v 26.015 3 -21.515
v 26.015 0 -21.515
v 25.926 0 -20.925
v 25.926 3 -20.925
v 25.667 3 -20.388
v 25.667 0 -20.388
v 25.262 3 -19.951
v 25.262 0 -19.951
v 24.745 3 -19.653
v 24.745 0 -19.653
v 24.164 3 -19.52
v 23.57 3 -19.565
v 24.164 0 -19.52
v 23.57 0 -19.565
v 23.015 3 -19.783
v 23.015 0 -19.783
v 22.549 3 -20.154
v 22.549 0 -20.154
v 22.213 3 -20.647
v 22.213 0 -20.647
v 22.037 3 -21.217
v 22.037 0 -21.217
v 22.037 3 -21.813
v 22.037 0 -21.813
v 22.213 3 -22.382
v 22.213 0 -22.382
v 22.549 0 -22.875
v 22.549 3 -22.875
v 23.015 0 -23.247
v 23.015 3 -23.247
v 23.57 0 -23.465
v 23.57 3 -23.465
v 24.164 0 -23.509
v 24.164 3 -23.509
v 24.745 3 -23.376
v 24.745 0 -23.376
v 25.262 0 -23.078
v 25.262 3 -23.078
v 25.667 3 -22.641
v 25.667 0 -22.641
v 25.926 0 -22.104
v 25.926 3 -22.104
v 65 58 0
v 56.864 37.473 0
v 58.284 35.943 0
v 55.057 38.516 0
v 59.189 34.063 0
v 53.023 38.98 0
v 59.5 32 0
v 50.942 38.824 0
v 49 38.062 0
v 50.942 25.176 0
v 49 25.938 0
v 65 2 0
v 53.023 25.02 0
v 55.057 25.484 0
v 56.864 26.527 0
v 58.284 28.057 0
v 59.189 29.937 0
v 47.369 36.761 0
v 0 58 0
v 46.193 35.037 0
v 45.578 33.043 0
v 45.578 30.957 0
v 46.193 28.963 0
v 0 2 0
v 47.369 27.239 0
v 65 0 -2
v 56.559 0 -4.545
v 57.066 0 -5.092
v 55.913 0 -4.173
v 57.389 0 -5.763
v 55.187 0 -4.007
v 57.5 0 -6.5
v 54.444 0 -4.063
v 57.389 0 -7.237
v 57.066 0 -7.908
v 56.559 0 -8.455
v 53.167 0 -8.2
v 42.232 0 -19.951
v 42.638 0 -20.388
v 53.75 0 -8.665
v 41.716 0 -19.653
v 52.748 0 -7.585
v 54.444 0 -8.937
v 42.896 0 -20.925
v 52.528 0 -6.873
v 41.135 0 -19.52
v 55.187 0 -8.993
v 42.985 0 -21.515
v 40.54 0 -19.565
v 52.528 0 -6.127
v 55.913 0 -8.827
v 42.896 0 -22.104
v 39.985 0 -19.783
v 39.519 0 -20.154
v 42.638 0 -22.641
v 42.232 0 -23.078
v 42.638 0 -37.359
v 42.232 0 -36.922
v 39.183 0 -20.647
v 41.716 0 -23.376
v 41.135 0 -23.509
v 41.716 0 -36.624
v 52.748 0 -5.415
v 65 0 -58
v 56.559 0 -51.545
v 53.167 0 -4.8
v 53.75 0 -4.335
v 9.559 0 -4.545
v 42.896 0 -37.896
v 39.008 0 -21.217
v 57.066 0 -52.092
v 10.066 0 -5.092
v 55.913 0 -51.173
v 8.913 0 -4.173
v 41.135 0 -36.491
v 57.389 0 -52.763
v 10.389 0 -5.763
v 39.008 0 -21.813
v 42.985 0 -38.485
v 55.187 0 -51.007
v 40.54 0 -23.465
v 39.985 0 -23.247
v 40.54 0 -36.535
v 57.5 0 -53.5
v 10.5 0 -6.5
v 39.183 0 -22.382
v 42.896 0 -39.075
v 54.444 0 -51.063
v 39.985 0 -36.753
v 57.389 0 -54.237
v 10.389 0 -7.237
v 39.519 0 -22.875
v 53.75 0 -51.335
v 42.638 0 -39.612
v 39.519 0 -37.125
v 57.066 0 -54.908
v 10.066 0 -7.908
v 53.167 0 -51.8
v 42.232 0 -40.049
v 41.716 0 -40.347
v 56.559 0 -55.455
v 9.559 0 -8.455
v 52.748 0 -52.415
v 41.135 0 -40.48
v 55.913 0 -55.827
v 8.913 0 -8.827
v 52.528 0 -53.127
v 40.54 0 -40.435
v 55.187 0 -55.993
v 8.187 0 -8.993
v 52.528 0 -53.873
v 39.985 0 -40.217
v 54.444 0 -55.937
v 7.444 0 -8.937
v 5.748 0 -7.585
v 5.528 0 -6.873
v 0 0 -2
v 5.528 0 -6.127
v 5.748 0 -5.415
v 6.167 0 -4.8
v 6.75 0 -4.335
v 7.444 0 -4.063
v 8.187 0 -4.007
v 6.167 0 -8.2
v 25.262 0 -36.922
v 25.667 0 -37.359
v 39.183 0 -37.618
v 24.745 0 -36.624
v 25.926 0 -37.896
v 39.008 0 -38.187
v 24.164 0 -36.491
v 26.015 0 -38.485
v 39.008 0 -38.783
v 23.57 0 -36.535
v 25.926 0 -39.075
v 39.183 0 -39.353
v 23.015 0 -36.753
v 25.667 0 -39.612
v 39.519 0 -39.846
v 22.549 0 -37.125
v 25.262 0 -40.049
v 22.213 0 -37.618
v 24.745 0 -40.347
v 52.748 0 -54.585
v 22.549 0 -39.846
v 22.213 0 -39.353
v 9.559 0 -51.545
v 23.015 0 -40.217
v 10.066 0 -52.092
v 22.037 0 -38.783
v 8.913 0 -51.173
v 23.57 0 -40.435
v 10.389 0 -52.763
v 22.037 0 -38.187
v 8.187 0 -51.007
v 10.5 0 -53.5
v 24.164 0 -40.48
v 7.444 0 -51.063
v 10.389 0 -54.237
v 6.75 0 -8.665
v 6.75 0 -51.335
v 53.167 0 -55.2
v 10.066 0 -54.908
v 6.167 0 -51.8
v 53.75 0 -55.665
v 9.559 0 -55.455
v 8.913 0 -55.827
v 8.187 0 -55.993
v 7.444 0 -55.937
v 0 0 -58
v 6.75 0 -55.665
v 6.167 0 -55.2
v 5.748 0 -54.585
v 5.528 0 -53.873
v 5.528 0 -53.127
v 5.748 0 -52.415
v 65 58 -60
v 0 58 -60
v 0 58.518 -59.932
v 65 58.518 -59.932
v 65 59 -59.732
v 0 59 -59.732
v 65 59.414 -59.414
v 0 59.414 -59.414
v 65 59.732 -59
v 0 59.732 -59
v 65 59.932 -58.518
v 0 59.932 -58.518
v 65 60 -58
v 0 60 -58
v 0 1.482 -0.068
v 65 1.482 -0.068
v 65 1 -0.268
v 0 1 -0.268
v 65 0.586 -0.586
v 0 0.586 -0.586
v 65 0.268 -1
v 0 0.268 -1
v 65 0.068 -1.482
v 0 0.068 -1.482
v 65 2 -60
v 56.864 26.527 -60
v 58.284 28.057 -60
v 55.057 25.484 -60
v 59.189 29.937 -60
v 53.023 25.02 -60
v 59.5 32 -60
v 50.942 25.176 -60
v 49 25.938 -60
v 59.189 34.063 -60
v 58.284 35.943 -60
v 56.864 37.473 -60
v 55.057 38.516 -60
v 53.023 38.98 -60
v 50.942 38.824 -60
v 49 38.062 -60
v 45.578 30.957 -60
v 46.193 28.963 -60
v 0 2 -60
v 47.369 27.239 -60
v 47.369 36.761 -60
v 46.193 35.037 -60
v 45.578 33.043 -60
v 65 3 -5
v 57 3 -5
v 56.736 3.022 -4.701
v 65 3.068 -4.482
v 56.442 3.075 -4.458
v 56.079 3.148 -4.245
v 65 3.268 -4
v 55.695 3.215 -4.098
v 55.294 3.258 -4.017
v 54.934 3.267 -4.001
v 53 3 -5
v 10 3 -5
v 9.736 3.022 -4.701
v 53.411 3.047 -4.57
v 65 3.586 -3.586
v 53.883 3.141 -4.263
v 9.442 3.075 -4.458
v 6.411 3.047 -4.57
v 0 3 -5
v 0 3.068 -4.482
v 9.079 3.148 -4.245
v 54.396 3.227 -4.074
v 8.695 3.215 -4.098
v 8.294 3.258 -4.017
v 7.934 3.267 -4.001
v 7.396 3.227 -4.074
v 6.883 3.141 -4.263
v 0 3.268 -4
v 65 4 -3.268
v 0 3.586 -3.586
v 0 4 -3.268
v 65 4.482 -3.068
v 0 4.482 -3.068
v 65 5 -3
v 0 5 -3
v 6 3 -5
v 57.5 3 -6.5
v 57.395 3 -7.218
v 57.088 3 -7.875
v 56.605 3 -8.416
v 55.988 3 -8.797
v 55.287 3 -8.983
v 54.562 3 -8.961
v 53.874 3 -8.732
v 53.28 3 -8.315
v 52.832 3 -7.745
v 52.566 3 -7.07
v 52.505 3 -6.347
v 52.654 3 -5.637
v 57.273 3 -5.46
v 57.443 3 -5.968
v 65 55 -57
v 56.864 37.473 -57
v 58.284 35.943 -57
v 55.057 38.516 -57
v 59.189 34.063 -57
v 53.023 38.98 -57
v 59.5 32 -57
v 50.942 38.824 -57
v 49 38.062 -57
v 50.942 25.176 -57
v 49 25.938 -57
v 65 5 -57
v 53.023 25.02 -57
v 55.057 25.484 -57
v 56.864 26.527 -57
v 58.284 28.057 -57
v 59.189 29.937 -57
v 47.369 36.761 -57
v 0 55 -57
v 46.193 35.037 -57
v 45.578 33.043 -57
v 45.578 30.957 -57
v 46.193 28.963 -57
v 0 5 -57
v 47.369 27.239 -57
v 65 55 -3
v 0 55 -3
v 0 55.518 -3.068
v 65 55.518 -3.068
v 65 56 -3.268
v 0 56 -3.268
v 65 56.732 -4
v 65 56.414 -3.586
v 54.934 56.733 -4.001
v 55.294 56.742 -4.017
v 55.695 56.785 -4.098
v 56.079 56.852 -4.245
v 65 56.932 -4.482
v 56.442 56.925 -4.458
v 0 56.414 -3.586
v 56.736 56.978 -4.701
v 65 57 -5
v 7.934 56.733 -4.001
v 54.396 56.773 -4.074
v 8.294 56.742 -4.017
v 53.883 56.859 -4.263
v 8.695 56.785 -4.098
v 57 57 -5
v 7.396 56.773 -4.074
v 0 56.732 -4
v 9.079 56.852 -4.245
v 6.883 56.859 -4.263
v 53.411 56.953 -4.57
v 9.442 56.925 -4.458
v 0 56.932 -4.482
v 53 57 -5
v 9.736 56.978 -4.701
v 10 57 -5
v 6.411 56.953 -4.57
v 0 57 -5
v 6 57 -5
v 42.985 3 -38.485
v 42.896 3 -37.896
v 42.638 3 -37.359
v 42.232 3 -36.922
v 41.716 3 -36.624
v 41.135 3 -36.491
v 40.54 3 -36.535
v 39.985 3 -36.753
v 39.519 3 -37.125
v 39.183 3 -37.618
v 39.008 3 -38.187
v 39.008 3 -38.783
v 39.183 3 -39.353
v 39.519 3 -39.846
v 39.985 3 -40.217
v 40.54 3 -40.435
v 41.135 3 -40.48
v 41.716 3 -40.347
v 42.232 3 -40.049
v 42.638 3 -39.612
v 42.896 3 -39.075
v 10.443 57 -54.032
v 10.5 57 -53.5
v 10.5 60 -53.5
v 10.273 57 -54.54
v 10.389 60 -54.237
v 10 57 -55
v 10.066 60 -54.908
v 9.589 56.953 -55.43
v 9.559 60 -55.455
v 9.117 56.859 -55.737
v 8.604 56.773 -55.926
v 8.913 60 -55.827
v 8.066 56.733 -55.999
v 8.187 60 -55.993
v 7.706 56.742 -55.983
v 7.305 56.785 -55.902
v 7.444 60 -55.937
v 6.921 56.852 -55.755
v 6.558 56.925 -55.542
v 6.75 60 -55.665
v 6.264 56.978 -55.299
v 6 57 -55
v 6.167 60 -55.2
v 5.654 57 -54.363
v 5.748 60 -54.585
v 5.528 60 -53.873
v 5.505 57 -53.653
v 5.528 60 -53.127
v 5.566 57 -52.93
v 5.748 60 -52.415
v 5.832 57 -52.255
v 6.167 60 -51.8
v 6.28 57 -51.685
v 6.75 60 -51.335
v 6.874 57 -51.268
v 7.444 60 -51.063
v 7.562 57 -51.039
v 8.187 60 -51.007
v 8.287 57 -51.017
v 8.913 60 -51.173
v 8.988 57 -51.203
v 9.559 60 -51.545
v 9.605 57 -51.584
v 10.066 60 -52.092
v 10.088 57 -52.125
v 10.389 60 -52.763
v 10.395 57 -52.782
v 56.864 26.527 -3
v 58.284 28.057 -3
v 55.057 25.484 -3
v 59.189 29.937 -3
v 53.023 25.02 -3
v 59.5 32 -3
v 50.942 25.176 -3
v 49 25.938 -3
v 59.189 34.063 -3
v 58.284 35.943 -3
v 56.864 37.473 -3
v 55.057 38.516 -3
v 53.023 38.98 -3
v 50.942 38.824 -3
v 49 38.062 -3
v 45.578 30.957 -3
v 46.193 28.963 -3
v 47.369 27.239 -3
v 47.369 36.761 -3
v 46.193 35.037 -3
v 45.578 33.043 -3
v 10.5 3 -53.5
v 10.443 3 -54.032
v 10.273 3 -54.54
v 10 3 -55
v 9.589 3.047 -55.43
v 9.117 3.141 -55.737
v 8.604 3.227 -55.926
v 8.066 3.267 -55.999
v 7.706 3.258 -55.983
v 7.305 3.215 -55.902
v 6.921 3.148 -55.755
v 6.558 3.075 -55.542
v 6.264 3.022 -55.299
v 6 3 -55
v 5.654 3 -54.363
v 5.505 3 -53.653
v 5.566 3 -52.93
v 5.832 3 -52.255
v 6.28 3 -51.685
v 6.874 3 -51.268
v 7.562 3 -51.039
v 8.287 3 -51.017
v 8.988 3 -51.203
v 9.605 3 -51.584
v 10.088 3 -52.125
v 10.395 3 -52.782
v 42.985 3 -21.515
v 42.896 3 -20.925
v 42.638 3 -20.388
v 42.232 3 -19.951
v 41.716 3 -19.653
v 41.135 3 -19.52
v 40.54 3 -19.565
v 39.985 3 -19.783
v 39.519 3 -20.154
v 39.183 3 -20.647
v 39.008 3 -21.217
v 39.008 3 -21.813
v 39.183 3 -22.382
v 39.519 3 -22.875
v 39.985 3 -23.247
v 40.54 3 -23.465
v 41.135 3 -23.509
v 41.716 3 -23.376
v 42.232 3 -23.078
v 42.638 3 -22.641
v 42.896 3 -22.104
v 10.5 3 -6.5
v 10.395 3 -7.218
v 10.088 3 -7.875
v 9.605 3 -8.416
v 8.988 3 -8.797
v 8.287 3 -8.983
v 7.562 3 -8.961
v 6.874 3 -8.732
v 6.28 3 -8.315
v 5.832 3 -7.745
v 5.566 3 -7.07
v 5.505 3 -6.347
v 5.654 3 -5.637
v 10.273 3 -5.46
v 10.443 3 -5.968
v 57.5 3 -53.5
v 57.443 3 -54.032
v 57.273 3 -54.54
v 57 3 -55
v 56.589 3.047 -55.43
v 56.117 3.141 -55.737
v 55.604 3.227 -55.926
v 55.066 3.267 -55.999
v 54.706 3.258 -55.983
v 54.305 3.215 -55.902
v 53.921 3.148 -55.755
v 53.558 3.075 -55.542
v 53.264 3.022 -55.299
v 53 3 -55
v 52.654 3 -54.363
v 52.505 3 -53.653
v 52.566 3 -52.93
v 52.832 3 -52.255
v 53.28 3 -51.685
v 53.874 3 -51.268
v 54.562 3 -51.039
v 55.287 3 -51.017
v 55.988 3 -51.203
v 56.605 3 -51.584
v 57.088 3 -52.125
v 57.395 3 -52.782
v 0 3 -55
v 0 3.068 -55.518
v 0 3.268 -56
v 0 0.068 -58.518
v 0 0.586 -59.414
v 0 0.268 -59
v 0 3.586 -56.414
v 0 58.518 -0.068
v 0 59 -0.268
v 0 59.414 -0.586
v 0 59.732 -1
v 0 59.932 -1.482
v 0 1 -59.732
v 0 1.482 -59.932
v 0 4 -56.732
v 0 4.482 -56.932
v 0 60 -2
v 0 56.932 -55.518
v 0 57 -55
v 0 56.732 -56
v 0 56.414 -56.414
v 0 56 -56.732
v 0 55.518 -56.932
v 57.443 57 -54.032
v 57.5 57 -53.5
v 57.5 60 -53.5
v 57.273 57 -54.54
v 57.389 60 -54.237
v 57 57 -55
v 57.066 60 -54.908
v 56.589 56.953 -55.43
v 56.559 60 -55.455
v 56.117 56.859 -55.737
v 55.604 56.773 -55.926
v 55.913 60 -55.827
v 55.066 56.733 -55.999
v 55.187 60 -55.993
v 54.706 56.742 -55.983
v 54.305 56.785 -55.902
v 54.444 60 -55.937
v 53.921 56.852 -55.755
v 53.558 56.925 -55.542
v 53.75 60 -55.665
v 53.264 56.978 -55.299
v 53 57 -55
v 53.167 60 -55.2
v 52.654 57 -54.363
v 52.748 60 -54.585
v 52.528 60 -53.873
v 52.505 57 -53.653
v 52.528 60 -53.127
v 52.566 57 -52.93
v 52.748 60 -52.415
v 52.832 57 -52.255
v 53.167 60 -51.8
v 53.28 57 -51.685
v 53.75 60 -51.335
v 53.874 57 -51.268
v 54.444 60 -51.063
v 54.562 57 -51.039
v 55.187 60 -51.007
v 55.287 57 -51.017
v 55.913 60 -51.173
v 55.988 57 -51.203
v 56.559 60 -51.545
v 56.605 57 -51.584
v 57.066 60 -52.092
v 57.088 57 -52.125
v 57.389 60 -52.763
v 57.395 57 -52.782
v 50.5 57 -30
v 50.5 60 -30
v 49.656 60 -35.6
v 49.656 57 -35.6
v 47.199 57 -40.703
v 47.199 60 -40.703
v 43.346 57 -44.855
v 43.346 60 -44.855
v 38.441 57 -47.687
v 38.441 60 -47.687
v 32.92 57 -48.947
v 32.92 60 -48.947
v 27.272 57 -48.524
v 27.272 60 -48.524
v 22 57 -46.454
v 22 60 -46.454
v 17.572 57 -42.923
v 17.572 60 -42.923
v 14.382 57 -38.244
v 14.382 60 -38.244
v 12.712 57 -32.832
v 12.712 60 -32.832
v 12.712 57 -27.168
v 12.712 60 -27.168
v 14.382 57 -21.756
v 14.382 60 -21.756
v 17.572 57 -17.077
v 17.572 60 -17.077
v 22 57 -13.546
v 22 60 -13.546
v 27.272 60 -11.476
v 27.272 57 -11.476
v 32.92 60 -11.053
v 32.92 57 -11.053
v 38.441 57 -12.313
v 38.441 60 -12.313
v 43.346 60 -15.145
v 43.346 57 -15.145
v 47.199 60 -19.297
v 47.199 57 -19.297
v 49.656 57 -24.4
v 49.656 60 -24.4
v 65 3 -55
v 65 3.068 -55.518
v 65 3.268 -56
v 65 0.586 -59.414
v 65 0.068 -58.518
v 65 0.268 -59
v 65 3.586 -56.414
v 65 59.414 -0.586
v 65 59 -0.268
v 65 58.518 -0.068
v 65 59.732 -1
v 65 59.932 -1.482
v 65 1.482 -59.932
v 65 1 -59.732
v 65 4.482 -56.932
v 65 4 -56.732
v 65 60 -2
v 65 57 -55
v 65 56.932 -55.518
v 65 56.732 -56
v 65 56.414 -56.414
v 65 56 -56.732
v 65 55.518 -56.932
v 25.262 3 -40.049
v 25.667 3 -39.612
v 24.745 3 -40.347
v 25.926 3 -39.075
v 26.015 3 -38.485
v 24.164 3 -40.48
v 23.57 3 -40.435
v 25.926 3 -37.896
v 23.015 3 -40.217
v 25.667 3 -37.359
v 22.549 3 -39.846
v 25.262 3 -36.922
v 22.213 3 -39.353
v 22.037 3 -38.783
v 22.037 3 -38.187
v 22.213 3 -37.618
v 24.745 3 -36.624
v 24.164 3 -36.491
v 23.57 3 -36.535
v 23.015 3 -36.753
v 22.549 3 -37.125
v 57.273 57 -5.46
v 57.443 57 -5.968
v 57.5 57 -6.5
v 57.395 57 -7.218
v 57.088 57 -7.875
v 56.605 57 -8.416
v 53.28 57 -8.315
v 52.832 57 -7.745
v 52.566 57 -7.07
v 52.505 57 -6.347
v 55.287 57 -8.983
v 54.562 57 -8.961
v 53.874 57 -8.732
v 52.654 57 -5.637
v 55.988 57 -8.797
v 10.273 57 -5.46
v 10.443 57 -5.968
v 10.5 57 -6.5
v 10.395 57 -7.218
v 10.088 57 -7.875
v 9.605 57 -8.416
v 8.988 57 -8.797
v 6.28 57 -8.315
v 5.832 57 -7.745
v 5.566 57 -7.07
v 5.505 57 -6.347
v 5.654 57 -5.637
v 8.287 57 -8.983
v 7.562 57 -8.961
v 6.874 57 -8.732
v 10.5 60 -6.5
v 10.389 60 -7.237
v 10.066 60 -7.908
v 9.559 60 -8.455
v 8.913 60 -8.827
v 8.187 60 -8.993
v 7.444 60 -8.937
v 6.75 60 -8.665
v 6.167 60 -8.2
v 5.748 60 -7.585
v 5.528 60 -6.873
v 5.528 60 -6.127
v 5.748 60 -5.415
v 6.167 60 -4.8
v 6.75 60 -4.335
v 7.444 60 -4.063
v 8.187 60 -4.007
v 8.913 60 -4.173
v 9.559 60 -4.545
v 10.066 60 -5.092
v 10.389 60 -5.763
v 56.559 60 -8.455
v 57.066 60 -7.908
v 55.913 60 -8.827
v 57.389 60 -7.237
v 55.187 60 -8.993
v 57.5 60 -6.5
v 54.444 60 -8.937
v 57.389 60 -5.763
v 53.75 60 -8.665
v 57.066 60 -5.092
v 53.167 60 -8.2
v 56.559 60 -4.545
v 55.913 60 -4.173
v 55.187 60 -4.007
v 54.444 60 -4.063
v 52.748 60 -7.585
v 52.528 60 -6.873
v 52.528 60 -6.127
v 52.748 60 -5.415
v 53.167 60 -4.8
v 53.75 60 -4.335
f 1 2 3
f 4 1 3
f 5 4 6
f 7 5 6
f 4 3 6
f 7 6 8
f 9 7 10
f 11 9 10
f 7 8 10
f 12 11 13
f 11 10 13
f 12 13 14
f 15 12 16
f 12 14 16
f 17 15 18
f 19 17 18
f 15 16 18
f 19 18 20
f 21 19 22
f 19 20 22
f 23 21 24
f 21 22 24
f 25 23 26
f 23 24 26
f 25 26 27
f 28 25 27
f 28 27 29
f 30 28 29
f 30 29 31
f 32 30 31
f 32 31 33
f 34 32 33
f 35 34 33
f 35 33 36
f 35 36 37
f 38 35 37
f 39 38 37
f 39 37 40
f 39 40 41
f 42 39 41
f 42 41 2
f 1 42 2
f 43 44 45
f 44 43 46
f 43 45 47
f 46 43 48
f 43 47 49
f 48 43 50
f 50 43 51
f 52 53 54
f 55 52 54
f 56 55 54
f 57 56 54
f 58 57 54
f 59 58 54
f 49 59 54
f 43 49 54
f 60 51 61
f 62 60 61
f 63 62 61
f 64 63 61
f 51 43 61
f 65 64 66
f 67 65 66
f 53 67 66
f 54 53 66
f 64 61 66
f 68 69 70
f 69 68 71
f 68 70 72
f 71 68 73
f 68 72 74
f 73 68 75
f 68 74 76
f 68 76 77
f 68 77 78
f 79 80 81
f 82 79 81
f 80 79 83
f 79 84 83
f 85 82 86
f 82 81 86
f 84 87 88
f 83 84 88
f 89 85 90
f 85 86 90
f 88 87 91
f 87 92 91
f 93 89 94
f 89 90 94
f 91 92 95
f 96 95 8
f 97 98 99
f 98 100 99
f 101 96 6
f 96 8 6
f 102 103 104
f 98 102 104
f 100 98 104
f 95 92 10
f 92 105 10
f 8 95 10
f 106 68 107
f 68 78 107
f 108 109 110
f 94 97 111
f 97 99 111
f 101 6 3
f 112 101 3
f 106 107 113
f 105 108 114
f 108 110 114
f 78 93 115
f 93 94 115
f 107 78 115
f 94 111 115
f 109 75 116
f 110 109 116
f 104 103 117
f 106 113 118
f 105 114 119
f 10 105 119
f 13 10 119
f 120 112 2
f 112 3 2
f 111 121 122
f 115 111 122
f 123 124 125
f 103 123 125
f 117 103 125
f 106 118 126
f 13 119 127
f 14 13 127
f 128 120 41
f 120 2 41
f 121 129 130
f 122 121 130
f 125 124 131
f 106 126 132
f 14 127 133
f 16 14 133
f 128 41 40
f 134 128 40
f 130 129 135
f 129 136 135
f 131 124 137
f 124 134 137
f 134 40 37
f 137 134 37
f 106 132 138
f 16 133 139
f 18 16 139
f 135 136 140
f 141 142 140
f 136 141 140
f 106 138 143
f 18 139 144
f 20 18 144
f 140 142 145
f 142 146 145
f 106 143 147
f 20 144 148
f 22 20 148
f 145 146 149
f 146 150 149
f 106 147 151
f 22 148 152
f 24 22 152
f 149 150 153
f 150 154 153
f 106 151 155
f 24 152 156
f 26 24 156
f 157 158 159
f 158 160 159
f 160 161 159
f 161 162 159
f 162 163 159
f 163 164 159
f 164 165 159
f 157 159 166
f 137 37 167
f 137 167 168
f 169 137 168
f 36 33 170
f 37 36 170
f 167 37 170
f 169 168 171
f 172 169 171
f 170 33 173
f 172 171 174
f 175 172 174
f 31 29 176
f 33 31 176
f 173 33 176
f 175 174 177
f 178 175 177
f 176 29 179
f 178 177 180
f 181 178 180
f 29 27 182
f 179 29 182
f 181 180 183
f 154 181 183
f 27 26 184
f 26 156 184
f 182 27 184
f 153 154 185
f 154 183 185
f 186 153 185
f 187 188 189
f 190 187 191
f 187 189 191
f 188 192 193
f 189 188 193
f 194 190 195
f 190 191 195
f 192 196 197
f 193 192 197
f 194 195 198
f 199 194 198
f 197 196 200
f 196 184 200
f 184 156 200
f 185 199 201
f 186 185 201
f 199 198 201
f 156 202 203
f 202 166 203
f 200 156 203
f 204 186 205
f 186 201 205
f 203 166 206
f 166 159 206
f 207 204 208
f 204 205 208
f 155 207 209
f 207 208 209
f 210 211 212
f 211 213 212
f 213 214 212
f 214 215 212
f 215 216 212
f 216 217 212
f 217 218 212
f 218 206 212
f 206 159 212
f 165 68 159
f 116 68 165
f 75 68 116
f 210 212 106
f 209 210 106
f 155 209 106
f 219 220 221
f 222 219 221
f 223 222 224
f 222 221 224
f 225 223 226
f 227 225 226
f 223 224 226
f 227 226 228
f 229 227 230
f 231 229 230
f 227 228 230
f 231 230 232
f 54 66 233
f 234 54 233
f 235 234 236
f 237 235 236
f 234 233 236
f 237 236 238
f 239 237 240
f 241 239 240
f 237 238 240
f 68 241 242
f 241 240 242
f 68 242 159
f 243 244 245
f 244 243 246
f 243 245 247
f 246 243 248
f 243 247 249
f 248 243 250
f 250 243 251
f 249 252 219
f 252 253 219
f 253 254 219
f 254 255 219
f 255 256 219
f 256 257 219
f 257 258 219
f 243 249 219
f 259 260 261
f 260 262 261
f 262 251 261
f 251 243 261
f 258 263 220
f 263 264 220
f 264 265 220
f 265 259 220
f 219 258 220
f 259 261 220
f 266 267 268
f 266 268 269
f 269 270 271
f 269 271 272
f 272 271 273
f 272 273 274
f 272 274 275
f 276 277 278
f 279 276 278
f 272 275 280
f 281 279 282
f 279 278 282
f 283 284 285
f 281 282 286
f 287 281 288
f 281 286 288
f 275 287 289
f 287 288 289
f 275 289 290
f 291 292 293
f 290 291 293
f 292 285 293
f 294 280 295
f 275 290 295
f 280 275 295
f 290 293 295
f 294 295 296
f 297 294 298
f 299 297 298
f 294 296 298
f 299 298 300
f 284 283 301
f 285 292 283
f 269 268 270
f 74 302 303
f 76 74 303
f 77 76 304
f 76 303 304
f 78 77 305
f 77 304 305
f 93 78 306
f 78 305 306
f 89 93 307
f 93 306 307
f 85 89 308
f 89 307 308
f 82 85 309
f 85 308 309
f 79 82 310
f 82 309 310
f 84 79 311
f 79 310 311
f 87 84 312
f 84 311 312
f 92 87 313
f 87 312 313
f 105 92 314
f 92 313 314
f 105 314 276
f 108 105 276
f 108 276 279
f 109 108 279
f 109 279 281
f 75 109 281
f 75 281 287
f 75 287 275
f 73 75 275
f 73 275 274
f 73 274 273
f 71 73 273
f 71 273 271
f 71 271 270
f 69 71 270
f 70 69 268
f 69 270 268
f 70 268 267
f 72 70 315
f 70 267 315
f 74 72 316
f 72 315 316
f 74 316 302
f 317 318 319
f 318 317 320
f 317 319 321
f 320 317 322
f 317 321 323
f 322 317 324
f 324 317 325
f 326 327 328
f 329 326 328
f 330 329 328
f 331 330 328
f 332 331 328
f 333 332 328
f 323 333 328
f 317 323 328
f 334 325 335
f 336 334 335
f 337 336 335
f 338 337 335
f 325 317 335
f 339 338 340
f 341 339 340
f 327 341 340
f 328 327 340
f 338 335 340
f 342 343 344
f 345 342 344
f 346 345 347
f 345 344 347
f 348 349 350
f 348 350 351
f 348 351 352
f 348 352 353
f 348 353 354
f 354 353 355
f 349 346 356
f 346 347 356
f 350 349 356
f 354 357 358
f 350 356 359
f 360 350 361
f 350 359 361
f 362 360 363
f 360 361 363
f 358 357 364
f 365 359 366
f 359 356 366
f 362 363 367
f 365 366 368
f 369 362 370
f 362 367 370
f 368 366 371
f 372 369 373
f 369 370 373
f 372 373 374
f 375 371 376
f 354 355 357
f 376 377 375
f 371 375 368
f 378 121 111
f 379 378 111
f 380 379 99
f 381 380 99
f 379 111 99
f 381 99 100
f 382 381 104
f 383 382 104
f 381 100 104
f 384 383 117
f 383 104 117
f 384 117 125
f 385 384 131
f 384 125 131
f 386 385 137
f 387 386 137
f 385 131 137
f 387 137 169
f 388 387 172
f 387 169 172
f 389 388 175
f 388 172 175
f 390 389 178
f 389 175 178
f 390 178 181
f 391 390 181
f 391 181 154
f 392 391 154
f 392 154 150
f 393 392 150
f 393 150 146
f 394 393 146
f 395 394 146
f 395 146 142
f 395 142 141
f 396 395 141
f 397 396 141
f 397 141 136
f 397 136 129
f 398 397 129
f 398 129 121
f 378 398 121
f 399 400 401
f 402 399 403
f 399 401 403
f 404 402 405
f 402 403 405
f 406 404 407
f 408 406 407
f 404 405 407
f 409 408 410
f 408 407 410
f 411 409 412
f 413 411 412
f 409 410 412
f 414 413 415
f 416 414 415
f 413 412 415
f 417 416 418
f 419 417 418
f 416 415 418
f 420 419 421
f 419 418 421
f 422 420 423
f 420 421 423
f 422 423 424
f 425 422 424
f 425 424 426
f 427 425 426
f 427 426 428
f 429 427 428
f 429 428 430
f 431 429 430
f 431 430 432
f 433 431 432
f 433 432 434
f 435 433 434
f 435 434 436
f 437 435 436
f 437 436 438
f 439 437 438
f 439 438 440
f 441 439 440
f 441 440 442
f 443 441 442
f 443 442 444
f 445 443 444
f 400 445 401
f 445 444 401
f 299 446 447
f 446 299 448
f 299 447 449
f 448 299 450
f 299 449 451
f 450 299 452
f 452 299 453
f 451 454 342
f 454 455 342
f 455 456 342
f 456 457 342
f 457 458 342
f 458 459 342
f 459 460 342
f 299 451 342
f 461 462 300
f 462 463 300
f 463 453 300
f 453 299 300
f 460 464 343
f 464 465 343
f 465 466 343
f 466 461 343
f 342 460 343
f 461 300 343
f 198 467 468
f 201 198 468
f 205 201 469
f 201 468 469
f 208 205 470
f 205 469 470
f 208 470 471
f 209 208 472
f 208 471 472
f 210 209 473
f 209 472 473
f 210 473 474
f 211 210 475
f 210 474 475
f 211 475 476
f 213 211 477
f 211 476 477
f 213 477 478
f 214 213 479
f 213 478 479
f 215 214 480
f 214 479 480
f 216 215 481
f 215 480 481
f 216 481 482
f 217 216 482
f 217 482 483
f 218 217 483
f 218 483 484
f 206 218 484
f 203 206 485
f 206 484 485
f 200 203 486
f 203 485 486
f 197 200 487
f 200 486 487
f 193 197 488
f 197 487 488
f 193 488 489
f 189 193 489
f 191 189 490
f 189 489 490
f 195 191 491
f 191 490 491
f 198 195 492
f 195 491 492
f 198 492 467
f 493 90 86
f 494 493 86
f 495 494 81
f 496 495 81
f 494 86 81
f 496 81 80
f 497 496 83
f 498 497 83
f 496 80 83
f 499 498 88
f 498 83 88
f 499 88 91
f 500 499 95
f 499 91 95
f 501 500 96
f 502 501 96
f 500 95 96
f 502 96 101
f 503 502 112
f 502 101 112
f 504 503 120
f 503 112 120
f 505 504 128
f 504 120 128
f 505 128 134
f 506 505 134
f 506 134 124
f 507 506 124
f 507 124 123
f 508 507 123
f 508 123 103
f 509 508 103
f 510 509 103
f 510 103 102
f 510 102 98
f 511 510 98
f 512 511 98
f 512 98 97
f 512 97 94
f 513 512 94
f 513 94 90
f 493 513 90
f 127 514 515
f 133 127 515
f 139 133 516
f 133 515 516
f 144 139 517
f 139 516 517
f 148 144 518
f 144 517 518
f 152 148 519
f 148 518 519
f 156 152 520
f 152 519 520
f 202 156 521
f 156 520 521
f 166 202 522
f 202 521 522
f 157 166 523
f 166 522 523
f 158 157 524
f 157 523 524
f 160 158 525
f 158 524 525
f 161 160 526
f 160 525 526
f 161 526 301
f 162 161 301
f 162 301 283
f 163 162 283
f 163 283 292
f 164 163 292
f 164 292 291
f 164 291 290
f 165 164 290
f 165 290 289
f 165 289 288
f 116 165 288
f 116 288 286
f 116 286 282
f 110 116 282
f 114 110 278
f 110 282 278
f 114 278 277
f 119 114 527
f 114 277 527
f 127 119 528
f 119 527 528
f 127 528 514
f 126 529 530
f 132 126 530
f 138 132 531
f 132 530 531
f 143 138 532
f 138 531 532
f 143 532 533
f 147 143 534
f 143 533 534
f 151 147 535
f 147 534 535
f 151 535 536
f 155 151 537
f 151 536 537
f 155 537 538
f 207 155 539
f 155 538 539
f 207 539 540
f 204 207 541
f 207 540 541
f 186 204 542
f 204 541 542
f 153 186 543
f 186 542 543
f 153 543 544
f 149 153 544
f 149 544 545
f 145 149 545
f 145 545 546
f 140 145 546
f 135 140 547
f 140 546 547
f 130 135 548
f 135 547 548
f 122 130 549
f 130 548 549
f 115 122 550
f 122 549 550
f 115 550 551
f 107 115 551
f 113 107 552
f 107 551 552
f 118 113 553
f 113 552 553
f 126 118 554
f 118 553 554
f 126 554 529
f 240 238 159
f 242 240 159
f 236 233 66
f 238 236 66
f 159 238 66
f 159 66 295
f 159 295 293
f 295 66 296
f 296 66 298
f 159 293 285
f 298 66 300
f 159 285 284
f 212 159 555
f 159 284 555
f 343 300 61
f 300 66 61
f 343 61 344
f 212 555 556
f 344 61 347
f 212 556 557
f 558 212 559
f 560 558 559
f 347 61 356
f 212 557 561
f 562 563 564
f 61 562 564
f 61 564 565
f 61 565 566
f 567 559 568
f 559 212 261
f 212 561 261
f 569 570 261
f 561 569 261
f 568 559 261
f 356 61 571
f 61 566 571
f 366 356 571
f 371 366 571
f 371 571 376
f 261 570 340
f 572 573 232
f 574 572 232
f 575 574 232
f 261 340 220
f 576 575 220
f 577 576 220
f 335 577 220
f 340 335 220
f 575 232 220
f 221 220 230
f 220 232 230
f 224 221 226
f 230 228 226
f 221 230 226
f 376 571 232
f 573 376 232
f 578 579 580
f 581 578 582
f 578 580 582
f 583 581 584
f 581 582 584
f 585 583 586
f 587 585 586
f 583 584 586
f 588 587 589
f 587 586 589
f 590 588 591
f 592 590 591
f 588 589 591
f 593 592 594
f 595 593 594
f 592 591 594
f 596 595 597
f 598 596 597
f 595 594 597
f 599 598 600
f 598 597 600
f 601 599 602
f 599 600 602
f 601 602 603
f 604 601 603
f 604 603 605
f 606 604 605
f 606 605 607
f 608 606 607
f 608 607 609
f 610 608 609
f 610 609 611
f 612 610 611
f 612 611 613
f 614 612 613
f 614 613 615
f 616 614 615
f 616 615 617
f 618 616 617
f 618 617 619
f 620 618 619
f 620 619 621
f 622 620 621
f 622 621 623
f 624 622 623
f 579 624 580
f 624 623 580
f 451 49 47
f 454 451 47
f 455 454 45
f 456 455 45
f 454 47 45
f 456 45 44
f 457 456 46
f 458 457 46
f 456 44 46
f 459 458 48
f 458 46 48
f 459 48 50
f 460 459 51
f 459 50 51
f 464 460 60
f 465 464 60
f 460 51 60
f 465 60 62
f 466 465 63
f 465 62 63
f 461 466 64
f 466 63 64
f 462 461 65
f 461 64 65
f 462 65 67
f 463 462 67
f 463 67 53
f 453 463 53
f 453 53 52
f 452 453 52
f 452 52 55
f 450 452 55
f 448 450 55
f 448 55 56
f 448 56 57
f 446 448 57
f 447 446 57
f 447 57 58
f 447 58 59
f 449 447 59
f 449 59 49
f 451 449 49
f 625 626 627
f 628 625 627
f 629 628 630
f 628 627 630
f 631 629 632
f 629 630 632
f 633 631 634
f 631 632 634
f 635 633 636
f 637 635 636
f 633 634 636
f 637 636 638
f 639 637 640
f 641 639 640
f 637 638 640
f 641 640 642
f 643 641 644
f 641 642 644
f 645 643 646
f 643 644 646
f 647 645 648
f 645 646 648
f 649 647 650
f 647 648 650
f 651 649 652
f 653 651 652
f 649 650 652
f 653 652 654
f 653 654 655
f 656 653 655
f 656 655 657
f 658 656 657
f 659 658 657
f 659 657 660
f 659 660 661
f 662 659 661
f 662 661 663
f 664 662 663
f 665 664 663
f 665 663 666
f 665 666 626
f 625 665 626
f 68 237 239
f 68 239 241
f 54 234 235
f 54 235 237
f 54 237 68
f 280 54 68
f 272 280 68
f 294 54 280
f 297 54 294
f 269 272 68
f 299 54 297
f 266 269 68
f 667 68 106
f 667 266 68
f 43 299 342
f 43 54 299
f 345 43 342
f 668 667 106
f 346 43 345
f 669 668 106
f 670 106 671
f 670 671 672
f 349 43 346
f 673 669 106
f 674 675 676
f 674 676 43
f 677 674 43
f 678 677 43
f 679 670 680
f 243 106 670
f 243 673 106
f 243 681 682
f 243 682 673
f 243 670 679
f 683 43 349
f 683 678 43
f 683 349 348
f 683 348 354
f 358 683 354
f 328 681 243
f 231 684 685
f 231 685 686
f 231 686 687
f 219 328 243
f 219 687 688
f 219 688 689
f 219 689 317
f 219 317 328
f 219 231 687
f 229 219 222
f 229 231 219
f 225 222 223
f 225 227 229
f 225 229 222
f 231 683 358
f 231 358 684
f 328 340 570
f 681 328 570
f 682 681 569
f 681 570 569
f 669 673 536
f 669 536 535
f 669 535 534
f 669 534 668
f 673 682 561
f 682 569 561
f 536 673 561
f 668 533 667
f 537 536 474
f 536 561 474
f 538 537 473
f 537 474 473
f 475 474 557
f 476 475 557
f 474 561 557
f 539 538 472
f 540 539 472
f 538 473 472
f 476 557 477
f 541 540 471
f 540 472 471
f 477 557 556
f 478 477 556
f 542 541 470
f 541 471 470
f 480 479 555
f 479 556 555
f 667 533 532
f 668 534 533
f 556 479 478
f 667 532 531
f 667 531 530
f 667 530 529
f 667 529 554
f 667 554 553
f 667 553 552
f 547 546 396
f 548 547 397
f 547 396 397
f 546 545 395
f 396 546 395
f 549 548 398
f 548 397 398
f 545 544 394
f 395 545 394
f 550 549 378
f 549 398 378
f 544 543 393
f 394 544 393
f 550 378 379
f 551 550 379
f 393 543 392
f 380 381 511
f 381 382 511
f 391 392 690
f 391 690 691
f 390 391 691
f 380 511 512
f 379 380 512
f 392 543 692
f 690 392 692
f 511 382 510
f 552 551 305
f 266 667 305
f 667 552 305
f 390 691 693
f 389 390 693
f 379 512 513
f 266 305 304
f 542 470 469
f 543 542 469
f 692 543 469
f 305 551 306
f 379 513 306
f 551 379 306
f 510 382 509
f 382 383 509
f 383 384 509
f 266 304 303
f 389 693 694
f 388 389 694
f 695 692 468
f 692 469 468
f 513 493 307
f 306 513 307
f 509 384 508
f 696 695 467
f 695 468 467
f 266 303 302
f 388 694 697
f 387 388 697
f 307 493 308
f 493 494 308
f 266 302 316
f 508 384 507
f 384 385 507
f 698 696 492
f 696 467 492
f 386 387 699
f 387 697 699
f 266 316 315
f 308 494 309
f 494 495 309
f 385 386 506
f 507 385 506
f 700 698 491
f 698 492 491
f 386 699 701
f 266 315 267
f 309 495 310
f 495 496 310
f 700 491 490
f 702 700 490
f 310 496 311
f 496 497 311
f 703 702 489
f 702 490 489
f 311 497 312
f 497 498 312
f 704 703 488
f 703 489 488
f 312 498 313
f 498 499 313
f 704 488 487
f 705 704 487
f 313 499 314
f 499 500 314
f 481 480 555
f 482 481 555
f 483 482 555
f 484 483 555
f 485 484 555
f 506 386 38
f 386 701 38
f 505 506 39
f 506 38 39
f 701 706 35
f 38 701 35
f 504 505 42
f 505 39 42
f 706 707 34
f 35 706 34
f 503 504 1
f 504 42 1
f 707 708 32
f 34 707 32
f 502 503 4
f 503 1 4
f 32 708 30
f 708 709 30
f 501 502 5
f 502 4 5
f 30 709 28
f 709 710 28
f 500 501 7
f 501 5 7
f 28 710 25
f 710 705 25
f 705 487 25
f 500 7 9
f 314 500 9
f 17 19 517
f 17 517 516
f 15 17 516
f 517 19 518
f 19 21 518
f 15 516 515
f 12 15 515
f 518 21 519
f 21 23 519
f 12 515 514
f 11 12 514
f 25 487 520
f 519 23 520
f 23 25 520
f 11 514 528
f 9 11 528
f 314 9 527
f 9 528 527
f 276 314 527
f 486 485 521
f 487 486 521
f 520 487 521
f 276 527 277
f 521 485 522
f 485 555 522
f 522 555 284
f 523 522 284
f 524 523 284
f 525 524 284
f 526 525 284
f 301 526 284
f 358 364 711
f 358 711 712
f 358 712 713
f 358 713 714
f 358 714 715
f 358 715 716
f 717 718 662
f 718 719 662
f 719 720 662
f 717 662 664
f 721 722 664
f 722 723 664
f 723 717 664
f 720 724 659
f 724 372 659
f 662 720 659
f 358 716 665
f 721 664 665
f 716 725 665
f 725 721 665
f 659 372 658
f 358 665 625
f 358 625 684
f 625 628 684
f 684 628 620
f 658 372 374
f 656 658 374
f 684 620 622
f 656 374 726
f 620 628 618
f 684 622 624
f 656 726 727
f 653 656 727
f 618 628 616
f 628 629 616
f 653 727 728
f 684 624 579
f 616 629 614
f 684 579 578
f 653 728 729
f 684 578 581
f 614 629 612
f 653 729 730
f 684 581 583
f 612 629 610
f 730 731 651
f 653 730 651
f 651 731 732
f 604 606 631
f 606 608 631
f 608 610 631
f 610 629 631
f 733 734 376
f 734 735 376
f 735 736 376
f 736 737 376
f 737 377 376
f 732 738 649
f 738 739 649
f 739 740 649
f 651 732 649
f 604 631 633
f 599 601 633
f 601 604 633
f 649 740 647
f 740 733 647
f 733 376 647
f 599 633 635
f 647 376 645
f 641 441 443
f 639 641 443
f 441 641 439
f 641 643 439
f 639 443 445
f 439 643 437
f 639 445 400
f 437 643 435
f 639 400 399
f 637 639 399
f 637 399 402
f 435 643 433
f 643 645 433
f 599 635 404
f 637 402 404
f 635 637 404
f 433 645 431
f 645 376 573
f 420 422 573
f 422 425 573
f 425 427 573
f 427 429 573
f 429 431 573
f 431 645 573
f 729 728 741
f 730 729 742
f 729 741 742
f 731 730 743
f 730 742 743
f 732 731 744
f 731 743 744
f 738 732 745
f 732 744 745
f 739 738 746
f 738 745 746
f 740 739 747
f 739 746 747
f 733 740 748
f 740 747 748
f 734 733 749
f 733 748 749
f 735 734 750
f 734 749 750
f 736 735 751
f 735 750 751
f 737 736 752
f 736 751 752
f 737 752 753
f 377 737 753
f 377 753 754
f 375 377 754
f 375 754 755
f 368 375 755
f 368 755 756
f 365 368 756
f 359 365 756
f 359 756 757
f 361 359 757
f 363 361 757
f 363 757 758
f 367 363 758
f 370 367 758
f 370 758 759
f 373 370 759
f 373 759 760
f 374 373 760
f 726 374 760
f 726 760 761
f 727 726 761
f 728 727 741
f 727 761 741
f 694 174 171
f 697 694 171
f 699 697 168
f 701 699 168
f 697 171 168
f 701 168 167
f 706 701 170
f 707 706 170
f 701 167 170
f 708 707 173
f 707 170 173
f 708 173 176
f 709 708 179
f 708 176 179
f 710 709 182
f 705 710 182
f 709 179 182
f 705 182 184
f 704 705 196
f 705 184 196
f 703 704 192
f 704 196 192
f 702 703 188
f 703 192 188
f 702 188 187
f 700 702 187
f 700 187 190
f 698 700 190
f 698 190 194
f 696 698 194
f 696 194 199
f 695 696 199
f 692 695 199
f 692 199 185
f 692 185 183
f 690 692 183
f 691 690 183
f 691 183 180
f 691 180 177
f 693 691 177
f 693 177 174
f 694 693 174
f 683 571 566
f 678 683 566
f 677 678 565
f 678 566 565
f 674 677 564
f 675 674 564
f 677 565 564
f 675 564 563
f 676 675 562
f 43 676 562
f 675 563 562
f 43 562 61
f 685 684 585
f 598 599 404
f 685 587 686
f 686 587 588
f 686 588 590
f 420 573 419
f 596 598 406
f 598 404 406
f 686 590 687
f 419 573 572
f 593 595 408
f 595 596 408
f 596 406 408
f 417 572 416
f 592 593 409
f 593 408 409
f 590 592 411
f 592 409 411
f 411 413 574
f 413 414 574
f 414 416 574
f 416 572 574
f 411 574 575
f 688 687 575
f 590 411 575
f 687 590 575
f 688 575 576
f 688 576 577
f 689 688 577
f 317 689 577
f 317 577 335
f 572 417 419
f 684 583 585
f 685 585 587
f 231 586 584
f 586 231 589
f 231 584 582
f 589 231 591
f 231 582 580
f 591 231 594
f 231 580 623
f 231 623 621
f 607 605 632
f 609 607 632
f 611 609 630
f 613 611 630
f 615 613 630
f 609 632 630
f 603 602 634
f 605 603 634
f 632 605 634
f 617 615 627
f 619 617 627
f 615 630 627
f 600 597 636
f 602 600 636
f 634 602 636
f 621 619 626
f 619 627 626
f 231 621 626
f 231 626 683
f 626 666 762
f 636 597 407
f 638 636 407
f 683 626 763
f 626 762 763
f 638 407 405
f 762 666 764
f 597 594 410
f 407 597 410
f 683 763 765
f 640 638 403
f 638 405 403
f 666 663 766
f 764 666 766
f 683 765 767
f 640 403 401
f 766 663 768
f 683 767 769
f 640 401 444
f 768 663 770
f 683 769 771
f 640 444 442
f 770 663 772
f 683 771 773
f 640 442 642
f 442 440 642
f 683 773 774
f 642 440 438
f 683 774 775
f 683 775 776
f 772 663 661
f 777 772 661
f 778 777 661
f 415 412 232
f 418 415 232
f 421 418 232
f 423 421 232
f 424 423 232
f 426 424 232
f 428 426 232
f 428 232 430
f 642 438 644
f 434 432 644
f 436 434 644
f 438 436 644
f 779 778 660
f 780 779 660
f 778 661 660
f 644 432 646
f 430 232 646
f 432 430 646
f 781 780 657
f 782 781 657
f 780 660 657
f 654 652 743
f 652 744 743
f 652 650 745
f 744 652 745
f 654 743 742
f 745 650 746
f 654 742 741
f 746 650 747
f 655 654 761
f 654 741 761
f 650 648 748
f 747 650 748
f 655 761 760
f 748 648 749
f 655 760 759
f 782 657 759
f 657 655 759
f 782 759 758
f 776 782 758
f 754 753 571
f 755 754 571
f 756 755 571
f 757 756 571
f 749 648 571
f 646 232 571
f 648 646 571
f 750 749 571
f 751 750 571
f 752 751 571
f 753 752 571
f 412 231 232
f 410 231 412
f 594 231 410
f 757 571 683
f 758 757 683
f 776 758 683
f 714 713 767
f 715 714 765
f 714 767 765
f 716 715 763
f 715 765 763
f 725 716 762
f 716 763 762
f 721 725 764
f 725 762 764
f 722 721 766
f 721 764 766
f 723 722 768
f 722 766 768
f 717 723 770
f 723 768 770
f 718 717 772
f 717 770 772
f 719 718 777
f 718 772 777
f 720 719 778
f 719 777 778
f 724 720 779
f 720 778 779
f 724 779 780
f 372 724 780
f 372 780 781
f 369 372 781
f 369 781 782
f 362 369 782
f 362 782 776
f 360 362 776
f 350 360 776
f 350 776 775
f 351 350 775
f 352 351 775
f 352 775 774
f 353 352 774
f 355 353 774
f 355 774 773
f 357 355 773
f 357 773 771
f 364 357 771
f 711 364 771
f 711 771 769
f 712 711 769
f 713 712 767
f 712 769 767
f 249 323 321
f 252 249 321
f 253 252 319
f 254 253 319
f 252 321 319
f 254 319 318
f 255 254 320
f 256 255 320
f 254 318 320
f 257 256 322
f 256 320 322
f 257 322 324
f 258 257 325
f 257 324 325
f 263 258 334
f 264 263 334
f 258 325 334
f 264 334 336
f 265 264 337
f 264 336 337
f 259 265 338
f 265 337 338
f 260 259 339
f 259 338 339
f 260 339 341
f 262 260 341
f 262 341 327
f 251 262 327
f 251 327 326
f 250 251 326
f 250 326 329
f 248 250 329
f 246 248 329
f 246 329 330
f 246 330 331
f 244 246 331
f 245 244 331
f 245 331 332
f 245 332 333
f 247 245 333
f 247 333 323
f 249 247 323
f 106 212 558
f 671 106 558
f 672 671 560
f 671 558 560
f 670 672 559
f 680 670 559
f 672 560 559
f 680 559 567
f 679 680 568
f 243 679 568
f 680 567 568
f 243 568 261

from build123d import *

# Parameters (mm, degrees)
EXTRUDE_1_DEPTH     = 65
SKETCH_2_R          = 2.5
CUT_EXTRUDE_1_DEPTH = 61
SKETCH_3_R          = 7
CUT_EXTRUDE_2_DEPTH = 61
CUT_EXTRUDE_4_REACH = 62
SKETCH_7_R          = 2
CUT_EXTRUDE_5_REACH = 62
SKETCH_8_R          = 19


with BuildPart() as part:
    # 草图1 → 凸台-拉伸1 (new body)
    with BuildSketch(Plane(origin=(0, 0, 0), x_dir=(0, 0, -1), z_dir=(1, 0, 0))):
        with BuildLine():
            Line((60, 2), (60, 58))
            ThreePointArc((60, 58), (59.414213562, 59.414213562), (58, 60))
            Line((58, 60), (2, 60))
            ThreePointArc((2, 60), (0.585786438, 59.414213562), (0, 58))
            Line((0, 58), (0, 2))
            ThreePointArc((0, 2), (0.585786438, 0.585786438), (2, 0))
            Line((2, 0), (58, 0))
            ThreePointArc((58, 0), (59.414213562, 0.585786438), (60, 2))
        make_face()
        with BuildLine():
            Line((3, 5), (3, 55))
            ThreePointArc((3, 55), (3.585786438, 56.414213562), (5, 57))
            Line((5, 57), (55, 57))
            ThreePointArc((55, 57), (56.414213562, 56.414213562), (57, 55))
            Line((57, 55), (57, 5))
            ThreePointArc((57, 5), (56.414213562, 3.585786438), (55, 3))
            Line((55, 3), (5, 3))
            ThreePointArc((5, 3), (3.585786438, 3.585786438), (3, 5))
        make_face(mode=Mode.SUBTRACT)
    extrude(amount=EXTRUDE_1_DEPTH)

    # 草图2 → 切除-拉伸1 (cut, through all)
    with BuildSketch(Plane(origin=(0, 60, 0), x_dir=(1, 0, 0), z_dir=(0, 1, 0))):
        with Locations((8, 6.5)):
            Circle(SKETCH_2_R)
        with Locations((55, 6.5)):
            Circle(SKETCH_2_R)
        with Locations((55, 53.5)):
            Circle(SKETCH_2_R)
        with Locations((8, 53.5)):
            Circle(SKETCH_2_R)
    extrude(amount=-CUT_EXTRUDE_1_DEPTH, mode=Mode.SUBTRACT)

    # 草图3 → 切除-拉伸2 (cut, through all)
    with BuildSketch(Plane.XY):
        with Locations((52.5, 32)):
            Circle(SKETCH_3_R)
    extrude(amount=-CUT_EXTRUDE_2_DEPTH, mode=Mode.SUBTRACT)

    # 草图7 → 切除-拉伸4 (cut, up to next)
    with BuildSketch(Plane.XZ, mode=Mode.PRIVATE) as cut_extrude_4_sk1:
        with Locations((40.985281374, -38.485281374)):
            Circle(SKETCH_7_R)
    cut_extrude_4_tool1 = extrude(cut_extrude_4_sk1.sketch, amount=-CUT_EXTRUDE_4_REACH, mode=Mode.PRIVATE) & part.part
    add(cut_extrude_4_tool1.solids().sort_by_distance((40.985281, 0, -38.485281))[0], mode=Mode.SUBTRACT)
    # 草图7 → 切除-拉伸4 (cut, up to next)
    with BuildSketch(Plane.XZ, mode=Mode.PRIVATE) as cut_extrude_4_sk2:
        with Locations((24.014718626, -38.485281374)):
            Circle(SKETCH_7_R)
    cut_extrude_4_tool2 = extrude(cut_extrude_4_sk2.sketch, amount=-CUT_EXTRUDE_4_REACH, mode=Mode.PRIVATE) & part.part
    add(cut_extrude_4_tool2.solids().sort_by_distance((24.014719, 0, -38.485281))[0], mode=Mode.SUBTRACT)
    # 草图7 → 切除-拉伸4 (cut, up to next)
    with BuildSketch(Plane.XZ, mode=Mode.PRIVATE) as cut_extrude_4_sk3:
        with Locations((24.014718626, -21.514718626)):
            Circle(SKETCH_7_R)
    cut_extrude_4_tool3 = extrude(cut_extrude_4_sk3.sketch, amount=-CUT_EXTRUDE_4_REACH, mode=Mode.PRIVATE) & part.part
    add(cut_extrude_4_tool3.solids().sort_by_distance((24.014719, 0, -21.514719))[0], mode=Mode.SUBTRACT)
    # 草图7 → 切除-拉伸4 (cut, up to next)
    with BuildSketch(Plane.XZ, mode=Mode.PRIVATE) as cut_extrude_4_sk4:
        with Locations((40.985281374, -21.514718626)):
            Circle(SKETCH_7_R)
    cut_extrude_4_tool4 = extrude(cut_extrude_4_sk4.sketch, amount=-CUT_EXTRUDE_4_REACH, mode=Mode.PRIVATE) & part.part
    add(cut_extrude_4_tool4.solids().sort_by_distance((40.985281, 0, -21.514719))[0], mode=Mode.SUBTRACT)

    # 草图8 → 切除-拉伸5 (cut, up to next)
    with BuildSketch(Plane(origin=(0, 60, 0), x_dir=(1, 0, 0), z_dir=(0, 1, 0)), mode=Mode.PRIVATE) as cut_extrude_5_sk1:
        with Locations((31.5, 30)):
            Circle(SKETCH_8_R)
    cut_extrude_5_tool1 = extrude(cut_extrude_5_sk1.sketch, amount=-CUT_EXTRUDE_5_REACH, mode=Mode.PRIVATE) & part.part
    add(cut_extrude_5_tool1.solids().sort_by_distance((31.5, 60, -30))[0], mode=Mode.SUBTRACT)


solid = part.part
